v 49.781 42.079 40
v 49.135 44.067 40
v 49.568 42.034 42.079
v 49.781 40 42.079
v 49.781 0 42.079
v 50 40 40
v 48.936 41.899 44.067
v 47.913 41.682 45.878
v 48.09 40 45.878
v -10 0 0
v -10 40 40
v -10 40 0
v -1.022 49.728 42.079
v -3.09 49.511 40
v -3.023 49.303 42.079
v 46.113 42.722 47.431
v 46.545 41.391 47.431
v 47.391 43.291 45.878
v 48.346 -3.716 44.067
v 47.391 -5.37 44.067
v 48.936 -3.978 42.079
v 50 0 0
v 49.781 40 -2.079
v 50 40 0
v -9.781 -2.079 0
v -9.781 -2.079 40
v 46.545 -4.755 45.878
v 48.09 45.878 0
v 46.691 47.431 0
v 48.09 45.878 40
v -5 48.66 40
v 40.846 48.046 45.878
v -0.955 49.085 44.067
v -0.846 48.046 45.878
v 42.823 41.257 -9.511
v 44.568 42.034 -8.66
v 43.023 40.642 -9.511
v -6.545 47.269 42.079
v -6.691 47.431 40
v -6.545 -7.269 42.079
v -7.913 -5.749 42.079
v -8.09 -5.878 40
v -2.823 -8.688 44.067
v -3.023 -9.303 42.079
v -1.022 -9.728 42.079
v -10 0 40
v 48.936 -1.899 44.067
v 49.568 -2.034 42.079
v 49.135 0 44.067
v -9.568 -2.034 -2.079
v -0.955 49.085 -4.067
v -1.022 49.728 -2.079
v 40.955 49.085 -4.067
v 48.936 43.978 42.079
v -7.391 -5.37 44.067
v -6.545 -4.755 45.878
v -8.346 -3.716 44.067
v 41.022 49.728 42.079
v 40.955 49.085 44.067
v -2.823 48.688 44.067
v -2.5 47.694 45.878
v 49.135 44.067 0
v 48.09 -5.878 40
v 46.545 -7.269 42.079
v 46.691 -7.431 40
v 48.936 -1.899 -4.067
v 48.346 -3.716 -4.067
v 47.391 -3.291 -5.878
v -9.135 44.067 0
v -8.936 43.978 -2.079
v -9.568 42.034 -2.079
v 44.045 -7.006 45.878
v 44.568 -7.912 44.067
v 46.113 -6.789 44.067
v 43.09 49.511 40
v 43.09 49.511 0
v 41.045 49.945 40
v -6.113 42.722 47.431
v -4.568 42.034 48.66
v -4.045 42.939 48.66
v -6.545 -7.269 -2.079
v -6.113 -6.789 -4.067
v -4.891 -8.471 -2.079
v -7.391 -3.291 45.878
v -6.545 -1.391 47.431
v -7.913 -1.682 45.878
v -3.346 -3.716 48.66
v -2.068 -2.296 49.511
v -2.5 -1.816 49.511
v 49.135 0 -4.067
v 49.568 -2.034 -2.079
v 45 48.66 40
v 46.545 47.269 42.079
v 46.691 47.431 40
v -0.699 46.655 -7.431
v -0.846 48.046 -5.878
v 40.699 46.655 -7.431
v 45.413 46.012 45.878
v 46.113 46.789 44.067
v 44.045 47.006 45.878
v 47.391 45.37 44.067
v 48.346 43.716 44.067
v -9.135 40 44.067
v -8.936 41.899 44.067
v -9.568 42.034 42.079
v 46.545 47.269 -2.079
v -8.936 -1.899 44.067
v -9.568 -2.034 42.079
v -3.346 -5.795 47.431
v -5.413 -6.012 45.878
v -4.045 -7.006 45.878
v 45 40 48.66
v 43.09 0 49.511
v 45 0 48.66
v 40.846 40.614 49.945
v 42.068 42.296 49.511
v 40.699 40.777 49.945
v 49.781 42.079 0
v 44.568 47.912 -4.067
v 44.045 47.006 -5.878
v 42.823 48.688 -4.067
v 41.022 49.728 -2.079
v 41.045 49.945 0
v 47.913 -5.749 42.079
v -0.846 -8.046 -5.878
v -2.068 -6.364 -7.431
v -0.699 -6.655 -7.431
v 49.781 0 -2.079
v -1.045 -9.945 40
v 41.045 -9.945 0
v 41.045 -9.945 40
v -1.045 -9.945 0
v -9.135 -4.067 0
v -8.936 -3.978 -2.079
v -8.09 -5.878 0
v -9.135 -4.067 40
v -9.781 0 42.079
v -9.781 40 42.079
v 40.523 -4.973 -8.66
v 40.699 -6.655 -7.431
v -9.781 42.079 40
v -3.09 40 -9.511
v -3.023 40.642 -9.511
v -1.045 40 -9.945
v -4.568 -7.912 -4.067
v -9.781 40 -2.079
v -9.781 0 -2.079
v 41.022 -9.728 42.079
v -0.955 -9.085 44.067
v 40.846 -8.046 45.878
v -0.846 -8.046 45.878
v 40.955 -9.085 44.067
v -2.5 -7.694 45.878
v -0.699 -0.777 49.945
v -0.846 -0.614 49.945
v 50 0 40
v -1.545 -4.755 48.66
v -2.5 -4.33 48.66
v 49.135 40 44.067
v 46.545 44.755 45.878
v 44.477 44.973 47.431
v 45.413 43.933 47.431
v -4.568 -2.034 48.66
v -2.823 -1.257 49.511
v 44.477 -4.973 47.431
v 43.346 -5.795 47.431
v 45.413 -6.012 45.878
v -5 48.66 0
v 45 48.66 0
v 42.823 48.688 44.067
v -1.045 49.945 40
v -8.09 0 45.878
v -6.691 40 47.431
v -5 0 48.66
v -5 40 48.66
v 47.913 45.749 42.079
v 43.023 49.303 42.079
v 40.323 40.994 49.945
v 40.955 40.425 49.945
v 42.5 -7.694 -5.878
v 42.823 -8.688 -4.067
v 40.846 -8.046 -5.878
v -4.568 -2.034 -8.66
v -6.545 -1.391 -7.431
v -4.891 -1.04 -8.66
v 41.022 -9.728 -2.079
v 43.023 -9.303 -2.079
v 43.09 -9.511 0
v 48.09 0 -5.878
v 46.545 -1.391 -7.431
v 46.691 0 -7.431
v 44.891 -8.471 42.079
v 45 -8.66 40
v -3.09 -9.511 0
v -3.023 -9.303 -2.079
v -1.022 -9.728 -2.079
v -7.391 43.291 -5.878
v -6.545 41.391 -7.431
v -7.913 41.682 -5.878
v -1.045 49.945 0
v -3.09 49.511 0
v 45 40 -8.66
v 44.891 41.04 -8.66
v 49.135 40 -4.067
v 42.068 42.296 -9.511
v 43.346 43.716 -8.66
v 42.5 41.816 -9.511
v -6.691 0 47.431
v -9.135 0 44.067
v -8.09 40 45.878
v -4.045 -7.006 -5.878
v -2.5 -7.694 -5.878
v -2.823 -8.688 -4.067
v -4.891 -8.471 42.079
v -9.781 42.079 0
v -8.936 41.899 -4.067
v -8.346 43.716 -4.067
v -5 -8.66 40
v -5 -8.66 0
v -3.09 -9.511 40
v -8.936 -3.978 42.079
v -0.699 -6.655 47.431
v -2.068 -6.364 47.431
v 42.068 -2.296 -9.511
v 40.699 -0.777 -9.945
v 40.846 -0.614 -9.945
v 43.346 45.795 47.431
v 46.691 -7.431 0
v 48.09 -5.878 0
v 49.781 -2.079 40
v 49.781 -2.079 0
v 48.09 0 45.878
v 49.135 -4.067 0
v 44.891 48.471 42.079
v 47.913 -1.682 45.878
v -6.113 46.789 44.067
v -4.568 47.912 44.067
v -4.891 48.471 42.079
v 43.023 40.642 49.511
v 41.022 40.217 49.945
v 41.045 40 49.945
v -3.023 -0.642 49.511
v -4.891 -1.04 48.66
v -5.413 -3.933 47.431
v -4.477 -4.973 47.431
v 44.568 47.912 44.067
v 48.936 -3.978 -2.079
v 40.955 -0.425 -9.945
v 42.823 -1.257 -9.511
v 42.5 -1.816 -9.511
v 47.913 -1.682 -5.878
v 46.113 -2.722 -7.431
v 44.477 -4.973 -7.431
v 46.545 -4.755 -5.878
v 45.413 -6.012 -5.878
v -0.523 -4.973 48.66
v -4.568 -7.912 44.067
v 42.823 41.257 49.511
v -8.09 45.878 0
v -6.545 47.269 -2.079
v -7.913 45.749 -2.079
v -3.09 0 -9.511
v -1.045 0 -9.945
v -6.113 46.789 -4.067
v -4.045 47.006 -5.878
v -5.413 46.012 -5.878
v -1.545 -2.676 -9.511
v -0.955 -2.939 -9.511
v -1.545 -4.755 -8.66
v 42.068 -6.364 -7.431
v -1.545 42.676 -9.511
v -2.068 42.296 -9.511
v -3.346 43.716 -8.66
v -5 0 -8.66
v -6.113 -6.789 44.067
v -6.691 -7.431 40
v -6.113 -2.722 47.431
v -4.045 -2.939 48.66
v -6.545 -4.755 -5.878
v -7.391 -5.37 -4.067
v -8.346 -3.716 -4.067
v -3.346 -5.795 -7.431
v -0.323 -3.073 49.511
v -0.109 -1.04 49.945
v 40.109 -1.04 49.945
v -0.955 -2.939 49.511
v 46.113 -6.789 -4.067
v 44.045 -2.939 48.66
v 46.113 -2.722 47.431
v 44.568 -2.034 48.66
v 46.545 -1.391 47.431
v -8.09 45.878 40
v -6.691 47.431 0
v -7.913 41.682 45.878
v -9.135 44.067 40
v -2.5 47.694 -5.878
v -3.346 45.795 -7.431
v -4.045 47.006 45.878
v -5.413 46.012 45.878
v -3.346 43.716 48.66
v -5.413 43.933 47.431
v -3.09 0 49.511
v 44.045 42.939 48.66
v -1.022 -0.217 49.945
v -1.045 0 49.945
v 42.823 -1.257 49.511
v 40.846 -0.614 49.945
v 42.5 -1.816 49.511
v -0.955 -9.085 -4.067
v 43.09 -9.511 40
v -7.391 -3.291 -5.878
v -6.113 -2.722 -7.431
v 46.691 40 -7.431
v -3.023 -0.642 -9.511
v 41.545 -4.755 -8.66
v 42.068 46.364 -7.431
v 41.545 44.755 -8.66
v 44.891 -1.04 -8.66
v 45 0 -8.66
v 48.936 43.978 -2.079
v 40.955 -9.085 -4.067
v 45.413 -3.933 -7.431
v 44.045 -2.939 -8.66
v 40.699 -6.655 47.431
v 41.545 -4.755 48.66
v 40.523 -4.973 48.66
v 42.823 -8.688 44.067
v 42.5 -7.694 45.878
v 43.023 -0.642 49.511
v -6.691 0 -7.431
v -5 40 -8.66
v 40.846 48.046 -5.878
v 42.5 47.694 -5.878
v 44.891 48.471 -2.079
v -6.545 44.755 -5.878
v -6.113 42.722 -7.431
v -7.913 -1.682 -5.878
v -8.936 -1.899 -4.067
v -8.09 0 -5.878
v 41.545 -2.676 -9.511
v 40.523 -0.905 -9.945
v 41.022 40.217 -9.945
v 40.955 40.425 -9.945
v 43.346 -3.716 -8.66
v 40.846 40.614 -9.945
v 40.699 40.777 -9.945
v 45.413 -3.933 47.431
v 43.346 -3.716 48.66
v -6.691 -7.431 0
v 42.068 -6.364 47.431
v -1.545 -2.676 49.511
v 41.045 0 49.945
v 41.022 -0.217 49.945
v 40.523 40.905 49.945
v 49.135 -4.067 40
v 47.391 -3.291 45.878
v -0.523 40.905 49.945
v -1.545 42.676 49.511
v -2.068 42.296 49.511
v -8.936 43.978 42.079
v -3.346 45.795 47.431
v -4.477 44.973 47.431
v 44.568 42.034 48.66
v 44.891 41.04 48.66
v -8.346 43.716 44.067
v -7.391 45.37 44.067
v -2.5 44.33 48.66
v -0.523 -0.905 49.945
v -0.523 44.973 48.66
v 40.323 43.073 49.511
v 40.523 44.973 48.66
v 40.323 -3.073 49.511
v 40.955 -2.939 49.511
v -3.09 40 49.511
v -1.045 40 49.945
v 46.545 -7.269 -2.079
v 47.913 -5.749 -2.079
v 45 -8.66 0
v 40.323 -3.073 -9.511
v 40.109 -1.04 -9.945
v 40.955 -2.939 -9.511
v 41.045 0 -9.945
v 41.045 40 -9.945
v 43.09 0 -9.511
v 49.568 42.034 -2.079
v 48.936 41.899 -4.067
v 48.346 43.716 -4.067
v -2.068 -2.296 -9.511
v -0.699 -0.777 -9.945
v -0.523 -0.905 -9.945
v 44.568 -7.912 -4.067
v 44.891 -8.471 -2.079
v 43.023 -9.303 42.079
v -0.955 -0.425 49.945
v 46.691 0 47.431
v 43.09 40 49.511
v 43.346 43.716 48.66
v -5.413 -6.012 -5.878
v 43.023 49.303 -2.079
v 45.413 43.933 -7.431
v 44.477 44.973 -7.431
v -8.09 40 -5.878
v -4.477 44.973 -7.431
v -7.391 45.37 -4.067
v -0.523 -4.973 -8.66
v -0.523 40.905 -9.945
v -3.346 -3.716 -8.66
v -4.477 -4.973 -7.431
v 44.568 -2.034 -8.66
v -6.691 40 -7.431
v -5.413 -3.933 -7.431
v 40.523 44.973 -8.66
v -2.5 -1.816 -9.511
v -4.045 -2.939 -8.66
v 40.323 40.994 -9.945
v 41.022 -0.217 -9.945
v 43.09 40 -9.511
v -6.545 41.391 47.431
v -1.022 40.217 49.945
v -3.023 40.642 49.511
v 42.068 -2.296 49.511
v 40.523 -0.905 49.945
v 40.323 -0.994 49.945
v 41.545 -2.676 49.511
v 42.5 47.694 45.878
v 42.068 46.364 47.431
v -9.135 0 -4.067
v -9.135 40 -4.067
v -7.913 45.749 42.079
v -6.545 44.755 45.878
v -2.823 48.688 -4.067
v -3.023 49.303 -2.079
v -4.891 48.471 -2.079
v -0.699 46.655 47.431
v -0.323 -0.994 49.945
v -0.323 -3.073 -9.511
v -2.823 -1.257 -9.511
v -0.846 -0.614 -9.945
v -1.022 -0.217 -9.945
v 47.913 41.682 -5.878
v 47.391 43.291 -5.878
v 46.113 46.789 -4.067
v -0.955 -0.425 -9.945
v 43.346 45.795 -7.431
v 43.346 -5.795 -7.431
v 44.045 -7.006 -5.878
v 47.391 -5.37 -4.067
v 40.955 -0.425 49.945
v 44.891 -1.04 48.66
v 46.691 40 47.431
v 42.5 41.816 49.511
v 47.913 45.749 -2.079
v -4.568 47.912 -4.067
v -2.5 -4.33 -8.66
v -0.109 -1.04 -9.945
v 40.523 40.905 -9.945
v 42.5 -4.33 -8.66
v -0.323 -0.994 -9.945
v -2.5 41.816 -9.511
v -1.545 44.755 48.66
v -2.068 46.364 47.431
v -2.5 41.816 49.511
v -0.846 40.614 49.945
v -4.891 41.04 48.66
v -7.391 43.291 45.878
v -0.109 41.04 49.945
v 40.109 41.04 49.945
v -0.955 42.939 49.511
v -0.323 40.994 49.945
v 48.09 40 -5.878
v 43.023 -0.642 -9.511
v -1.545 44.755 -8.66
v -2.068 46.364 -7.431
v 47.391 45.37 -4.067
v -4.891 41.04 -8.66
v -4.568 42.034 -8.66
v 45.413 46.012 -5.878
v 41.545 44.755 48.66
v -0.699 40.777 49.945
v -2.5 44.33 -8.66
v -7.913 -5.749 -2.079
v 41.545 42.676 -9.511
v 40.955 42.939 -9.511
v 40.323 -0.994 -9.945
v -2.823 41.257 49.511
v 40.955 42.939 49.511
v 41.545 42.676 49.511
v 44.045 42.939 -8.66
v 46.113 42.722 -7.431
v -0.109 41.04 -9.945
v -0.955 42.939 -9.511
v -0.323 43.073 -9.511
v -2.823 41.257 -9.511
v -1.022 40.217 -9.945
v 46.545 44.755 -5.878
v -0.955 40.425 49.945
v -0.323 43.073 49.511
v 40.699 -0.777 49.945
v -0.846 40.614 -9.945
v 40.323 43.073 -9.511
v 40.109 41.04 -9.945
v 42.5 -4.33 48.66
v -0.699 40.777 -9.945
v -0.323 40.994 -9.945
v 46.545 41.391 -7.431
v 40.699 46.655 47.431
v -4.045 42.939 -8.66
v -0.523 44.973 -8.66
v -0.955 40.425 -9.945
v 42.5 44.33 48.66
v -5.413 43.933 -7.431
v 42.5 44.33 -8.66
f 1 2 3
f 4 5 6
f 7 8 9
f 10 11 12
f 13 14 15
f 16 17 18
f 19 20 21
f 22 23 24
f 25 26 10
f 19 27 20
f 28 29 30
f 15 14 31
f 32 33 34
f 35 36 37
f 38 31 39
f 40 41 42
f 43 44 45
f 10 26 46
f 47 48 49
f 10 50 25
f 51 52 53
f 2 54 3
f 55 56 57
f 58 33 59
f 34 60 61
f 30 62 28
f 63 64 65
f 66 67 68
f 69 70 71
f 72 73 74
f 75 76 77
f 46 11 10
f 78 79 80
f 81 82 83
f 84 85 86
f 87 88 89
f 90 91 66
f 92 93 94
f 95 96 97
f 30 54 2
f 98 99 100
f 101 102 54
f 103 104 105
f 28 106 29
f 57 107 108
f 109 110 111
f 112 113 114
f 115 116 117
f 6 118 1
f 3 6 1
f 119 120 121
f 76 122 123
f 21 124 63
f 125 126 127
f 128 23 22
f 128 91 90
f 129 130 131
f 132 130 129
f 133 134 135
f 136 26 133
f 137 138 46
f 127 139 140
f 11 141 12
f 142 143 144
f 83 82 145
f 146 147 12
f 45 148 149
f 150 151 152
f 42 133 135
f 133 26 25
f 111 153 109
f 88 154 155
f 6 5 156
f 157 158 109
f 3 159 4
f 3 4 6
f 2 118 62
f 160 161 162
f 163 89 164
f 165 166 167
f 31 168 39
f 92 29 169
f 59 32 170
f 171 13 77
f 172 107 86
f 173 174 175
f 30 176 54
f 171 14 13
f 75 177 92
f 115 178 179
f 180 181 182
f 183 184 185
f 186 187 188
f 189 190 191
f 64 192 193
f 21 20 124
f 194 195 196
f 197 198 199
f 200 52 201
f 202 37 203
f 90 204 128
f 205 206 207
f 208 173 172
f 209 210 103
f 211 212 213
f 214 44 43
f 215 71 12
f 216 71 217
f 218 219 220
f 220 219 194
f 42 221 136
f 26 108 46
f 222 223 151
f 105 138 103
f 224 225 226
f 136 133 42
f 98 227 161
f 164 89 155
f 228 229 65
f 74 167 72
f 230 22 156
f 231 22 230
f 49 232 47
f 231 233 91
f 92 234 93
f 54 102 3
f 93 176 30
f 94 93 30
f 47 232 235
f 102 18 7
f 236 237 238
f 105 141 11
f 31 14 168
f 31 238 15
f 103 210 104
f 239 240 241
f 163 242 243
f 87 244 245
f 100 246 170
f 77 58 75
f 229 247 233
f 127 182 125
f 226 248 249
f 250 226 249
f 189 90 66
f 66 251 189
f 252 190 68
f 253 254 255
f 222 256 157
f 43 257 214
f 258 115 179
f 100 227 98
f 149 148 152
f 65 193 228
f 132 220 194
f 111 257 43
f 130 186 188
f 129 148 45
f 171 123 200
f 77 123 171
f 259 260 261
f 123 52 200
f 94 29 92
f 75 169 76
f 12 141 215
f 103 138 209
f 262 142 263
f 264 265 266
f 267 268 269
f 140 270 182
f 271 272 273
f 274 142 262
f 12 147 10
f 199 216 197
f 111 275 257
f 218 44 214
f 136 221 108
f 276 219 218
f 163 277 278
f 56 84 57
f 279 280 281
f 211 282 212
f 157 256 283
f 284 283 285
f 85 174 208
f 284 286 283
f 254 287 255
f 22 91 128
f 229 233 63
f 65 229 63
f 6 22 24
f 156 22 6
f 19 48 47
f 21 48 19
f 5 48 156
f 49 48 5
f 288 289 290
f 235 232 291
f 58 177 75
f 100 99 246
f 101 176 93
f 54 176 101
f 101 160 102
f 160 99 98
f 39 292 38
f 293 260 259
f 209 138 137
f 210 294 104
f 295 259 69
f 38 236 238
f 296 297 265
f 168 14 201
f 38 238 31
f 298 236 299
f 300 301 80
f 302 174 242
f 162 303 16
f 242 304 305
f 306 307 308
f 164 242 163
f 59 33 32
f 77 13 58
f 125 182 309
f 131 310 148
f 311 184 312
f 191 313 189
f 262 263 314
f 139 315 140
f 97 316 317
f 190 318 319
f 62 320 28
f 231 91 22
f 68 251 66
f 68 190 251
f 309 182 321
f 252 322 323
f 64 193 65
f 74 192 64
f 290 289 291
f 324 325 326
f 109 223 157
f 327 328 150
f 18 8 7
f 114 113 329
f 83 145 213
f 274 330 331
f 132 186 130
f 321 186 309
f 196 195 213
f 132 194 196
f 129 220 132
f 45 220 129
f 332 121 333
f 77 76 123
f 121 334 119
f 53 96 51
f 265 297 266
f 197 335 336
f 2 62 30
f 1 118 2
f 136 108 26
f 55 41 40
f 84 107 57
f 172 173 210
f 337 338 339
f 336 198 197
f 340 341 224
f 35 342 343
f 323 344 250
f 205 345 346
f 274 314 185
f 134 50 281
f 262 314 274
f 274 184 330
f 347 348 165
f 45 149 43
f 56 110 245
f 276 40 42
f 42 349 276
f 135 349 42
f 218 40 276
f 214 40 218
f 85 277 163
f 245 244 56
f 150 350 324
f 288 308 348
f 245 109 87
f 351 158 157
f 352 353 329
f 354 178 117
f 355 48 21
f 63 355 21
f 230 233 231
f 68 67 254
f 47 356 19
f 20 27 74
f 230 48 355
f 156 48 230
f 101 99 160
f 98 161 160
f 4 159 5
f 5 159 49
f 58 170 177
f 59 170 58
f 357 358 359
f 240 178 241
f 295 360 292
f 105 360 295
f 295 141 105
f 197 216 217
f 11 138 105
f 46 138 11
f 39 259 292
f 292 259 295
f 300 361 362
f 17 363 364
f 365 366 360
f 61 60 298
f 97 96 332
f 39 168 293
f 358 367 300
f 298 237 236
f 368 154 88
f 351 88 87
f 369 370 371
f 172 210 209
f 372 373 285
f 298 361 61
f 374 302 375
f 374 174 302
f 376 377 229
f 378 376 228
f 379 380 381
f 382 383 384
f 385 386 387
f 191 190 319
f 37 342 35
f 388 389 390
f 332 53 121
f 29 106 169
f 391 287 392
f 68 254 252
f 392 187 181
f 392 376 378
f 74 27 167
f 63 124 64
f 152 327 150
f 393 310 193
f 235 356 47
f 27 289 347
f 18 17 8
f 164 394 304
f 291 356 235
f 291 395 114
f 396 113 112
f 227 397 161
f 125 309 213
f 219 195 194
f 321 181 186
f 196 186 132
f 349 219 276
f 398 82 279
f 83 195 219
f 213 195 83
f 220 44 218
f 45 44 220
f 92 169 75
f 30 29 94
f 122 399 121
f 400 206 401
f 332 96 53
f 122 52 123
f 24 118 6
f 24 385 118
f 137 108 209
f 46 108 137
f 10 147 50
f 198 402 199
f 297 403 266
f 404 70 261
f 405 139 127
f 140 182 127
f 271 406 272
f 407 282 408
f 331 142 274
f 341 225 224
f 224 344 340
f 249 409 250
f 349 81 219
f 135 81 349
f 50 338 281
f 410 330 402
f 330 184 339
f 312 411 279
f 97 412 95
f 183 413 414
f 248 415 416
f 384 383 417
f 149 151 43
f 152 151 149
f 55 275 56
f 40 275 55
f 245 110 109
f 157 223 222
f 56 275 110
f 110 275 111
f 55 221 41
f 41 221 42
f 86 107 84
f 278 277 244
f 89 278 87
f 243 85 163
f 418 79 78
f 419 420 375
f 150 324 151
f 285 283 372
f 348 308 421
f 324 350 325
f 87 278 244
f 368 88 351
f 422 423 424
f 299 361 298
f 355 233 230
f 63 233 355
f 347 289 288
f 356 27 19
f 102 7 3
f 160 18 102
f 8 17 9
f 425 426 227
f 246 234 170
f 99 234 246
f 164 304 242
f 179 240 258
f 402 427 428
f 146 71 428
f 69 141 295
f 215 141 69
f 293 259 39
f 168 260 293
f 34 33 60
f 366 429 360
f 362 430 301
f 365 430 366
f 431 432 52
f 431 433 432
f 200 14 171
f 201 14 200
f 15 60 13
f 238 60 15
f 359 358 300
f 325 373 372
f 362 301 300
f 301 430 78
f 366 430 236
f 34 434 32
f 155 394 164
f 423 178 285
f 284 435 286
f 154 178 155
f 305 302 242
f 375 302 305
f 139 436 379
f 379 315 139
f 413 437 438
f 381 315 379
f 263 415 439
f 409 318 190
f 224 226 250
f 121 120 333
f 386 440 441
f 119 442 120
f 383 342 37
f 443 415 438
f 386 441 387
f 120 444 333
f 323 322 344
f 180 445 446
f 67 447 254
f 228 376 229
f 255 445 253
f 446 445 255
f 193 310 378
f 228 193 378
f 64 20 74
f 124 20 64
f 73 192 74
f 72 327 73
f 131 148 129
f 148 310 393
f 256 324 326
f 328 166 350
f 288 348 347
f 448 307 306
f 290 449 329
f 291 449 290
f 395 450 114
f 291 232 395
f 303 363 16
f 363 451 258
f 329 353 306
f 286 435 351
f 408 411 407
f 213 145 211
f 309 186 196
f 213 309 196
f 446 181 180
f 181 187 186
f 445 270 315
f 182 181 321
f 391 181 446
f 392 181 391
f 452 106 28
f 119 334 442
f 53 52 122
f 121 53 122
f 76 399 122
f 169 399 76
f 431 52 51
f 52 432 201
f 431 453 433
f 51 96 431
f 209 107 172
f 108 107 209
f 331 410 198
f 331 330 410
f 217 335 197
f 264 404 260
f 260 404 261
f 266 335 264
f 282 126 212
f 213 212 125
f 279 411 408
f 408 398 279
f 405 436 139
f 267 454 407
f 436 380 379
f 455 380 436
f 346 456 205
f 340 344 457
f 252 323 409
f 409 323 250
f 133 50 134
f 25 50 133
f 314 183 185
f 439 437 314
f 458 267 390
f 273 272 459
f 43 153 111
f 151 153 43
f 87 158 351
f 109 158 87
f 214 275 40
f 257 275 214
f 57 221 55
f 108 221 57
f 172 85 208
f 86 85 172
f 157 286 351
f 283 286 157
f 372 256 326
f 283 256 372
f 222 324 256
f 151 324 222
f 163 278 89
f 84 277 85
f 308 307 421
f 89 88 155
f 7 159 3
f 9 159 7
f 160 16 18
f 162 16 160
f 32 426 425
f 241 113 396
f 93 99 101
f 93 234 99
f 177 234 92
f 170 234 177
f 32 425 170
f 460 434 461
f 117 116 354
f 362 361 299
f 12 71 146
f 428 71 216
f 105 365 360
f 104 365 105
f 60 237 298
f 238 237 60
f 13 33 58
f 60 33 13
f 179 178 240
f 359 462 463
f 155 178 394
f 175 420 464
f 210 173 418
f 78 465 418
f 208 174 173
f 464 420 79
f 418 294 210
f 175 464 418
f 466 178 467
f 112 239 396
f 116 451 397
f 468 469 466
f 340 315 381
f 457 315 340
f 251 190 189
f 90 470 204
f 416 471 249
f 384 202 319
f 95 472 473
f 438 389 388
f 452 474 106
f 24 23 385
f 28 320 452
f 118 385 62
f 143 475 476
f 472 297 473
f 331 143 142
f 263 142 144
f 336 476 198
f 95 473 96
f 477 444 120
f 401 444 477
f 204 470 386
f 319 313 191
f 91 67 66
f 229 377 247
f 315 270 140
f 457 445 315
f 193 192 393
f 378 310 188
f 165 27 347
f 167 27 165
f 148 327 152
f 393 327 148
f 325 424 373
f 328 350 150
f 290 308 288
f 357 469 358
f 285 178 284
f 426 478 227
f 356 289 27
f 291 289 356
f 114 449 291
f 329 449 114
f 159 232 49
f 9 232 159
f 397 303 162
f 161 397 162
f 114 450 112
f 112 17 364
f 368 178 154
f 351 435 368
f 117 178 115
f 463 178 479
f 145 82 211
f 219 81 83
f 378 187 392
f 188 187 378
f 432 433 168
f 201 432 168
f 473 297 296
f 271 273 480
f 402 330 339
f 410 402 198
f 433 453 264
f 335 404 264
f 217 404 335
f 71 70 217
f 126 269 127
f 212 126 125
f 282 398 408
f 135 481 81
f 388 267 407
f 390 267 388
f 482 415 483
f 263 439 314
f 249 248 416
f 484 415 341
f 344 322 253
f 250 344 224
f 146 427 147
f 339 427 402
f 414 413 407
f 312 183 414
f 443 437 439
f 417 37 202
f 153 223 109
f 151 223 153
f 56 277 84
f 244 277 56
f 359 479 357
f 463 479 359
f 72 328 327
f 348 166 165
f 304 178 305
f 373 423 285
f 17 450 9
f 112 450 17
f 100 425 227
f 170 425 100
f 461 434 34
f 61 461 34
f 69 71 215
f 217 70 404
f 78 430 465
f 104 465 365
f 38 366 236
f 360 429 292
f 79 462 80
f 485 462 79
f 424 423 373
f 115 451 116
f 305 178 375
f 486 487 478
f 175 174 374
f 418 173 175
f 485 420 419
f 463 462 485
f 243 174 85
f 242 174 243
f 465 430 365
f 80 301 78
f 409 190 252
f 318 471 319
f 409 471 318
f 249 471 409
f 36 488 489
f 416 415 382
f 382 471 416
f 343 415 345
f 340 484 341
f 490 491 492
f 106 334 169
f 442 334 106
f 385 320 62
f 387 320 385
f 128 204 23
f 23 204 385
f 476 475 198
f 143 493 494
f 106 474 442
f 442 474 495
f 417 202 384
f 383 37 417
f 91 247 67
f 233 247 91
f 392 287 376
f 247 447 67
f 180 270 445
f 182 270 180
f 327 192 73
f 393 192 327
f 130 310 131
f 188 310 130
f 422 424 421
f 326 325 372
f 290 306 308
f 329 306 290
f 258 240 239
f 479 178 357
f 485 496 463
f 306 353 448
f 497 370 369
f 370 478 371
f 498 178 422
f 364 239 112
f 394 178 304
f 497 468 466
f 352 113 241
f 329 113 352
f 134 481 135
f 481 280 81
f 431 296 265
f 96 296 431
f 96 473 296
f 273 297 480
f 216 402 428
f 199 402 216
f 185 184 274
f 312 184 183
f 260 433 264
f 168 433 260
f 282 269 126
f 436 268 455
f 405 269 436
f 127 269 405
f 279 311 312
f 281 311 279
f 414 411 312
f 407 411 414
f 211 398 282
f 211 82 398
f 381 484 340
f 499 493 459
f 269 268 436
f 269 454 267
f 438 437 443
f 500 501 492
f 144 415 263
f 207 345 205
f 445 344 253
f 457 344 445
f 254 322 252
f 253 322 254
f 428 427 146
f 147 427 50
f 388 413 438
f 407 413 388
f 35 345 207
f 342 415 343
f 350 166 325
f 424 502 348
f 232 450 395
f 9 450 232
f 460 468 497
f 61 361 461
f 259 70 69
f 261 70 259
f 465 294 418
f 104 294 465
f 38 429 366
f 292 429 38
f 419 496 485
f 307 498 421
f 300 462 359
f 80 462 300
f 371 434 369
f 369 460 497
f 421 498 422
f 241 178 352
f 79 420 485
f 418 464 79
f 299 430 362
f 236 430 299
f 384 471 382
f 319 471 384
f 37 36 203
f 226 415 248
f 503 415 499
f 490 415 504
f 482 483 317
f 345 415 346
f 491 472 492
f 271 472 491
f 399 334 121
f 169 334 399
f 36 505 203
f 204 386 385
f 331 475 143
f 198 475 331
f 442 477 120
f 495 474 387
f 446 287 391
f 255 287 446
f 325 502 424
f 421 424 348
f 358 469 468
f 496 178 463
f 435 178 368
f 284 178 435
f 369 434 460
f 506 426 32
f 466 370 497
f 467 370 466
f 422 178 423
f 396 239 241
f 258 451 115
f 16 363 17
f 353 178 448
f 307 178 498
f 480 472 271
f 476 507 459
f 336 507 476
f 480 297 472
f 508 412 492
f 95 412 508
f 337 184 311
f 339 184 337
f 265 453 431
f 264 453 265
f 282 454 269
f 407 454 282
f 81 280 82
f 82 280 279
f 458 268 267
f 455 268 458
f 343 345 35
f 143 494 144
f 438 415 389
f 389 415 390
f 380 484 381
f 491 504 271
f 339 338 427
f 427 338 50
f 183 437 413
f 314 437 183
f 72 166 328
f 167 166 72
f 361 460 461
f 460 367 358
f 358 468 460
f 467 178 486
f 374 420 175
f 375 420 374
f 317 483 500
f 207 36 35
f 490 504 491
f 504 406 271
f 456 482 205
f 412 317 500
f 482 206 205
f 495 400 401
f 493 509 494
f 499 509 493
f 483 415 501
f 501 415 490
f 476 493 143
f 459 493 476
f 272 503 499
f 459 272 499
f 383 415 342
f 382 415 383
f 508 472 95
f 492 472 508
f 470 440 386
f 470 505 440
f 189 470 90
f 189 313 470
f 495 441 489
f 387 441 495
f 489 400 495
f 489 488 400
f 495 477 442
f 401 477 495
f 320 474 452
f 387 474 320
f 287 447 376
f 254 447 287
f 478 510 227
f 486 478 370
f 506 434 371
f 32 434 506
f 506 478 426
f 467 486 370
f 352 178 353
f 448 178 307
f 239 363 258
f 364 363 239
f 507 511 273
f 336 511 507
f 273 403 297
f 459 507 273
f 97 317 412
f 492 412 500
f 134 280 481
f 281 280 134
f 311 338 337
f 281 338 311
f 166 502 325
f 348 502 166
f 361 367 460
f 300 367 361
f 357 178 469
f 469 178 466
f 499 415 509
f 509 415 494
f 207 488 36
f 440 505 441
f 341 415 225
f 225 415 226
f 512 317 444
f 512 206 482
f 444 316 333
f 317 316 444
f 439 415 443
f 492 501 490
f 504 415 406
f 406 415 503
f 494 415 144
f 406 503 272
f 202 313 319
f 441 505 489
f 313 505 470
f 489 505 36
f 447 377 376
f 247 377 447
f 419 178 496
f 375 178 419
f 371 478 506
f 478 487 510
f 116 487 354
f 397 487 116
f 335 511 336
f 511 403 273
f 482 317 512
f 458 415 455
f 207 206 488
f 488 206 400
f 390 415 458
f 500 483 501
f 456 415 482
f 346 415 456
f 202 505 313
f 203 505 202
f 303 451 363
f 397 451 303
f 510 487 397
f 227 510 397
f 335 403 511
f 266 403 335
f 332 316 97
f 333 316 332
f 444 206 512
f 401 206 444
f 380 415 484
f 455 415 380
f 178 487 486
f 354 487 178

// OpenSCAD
minkowski() {
    cube(size=[40,40,40]);
    //cylinder(r=10);
    // Using a sphere is possible, but will kill performance
    sphere(r=10);
}
